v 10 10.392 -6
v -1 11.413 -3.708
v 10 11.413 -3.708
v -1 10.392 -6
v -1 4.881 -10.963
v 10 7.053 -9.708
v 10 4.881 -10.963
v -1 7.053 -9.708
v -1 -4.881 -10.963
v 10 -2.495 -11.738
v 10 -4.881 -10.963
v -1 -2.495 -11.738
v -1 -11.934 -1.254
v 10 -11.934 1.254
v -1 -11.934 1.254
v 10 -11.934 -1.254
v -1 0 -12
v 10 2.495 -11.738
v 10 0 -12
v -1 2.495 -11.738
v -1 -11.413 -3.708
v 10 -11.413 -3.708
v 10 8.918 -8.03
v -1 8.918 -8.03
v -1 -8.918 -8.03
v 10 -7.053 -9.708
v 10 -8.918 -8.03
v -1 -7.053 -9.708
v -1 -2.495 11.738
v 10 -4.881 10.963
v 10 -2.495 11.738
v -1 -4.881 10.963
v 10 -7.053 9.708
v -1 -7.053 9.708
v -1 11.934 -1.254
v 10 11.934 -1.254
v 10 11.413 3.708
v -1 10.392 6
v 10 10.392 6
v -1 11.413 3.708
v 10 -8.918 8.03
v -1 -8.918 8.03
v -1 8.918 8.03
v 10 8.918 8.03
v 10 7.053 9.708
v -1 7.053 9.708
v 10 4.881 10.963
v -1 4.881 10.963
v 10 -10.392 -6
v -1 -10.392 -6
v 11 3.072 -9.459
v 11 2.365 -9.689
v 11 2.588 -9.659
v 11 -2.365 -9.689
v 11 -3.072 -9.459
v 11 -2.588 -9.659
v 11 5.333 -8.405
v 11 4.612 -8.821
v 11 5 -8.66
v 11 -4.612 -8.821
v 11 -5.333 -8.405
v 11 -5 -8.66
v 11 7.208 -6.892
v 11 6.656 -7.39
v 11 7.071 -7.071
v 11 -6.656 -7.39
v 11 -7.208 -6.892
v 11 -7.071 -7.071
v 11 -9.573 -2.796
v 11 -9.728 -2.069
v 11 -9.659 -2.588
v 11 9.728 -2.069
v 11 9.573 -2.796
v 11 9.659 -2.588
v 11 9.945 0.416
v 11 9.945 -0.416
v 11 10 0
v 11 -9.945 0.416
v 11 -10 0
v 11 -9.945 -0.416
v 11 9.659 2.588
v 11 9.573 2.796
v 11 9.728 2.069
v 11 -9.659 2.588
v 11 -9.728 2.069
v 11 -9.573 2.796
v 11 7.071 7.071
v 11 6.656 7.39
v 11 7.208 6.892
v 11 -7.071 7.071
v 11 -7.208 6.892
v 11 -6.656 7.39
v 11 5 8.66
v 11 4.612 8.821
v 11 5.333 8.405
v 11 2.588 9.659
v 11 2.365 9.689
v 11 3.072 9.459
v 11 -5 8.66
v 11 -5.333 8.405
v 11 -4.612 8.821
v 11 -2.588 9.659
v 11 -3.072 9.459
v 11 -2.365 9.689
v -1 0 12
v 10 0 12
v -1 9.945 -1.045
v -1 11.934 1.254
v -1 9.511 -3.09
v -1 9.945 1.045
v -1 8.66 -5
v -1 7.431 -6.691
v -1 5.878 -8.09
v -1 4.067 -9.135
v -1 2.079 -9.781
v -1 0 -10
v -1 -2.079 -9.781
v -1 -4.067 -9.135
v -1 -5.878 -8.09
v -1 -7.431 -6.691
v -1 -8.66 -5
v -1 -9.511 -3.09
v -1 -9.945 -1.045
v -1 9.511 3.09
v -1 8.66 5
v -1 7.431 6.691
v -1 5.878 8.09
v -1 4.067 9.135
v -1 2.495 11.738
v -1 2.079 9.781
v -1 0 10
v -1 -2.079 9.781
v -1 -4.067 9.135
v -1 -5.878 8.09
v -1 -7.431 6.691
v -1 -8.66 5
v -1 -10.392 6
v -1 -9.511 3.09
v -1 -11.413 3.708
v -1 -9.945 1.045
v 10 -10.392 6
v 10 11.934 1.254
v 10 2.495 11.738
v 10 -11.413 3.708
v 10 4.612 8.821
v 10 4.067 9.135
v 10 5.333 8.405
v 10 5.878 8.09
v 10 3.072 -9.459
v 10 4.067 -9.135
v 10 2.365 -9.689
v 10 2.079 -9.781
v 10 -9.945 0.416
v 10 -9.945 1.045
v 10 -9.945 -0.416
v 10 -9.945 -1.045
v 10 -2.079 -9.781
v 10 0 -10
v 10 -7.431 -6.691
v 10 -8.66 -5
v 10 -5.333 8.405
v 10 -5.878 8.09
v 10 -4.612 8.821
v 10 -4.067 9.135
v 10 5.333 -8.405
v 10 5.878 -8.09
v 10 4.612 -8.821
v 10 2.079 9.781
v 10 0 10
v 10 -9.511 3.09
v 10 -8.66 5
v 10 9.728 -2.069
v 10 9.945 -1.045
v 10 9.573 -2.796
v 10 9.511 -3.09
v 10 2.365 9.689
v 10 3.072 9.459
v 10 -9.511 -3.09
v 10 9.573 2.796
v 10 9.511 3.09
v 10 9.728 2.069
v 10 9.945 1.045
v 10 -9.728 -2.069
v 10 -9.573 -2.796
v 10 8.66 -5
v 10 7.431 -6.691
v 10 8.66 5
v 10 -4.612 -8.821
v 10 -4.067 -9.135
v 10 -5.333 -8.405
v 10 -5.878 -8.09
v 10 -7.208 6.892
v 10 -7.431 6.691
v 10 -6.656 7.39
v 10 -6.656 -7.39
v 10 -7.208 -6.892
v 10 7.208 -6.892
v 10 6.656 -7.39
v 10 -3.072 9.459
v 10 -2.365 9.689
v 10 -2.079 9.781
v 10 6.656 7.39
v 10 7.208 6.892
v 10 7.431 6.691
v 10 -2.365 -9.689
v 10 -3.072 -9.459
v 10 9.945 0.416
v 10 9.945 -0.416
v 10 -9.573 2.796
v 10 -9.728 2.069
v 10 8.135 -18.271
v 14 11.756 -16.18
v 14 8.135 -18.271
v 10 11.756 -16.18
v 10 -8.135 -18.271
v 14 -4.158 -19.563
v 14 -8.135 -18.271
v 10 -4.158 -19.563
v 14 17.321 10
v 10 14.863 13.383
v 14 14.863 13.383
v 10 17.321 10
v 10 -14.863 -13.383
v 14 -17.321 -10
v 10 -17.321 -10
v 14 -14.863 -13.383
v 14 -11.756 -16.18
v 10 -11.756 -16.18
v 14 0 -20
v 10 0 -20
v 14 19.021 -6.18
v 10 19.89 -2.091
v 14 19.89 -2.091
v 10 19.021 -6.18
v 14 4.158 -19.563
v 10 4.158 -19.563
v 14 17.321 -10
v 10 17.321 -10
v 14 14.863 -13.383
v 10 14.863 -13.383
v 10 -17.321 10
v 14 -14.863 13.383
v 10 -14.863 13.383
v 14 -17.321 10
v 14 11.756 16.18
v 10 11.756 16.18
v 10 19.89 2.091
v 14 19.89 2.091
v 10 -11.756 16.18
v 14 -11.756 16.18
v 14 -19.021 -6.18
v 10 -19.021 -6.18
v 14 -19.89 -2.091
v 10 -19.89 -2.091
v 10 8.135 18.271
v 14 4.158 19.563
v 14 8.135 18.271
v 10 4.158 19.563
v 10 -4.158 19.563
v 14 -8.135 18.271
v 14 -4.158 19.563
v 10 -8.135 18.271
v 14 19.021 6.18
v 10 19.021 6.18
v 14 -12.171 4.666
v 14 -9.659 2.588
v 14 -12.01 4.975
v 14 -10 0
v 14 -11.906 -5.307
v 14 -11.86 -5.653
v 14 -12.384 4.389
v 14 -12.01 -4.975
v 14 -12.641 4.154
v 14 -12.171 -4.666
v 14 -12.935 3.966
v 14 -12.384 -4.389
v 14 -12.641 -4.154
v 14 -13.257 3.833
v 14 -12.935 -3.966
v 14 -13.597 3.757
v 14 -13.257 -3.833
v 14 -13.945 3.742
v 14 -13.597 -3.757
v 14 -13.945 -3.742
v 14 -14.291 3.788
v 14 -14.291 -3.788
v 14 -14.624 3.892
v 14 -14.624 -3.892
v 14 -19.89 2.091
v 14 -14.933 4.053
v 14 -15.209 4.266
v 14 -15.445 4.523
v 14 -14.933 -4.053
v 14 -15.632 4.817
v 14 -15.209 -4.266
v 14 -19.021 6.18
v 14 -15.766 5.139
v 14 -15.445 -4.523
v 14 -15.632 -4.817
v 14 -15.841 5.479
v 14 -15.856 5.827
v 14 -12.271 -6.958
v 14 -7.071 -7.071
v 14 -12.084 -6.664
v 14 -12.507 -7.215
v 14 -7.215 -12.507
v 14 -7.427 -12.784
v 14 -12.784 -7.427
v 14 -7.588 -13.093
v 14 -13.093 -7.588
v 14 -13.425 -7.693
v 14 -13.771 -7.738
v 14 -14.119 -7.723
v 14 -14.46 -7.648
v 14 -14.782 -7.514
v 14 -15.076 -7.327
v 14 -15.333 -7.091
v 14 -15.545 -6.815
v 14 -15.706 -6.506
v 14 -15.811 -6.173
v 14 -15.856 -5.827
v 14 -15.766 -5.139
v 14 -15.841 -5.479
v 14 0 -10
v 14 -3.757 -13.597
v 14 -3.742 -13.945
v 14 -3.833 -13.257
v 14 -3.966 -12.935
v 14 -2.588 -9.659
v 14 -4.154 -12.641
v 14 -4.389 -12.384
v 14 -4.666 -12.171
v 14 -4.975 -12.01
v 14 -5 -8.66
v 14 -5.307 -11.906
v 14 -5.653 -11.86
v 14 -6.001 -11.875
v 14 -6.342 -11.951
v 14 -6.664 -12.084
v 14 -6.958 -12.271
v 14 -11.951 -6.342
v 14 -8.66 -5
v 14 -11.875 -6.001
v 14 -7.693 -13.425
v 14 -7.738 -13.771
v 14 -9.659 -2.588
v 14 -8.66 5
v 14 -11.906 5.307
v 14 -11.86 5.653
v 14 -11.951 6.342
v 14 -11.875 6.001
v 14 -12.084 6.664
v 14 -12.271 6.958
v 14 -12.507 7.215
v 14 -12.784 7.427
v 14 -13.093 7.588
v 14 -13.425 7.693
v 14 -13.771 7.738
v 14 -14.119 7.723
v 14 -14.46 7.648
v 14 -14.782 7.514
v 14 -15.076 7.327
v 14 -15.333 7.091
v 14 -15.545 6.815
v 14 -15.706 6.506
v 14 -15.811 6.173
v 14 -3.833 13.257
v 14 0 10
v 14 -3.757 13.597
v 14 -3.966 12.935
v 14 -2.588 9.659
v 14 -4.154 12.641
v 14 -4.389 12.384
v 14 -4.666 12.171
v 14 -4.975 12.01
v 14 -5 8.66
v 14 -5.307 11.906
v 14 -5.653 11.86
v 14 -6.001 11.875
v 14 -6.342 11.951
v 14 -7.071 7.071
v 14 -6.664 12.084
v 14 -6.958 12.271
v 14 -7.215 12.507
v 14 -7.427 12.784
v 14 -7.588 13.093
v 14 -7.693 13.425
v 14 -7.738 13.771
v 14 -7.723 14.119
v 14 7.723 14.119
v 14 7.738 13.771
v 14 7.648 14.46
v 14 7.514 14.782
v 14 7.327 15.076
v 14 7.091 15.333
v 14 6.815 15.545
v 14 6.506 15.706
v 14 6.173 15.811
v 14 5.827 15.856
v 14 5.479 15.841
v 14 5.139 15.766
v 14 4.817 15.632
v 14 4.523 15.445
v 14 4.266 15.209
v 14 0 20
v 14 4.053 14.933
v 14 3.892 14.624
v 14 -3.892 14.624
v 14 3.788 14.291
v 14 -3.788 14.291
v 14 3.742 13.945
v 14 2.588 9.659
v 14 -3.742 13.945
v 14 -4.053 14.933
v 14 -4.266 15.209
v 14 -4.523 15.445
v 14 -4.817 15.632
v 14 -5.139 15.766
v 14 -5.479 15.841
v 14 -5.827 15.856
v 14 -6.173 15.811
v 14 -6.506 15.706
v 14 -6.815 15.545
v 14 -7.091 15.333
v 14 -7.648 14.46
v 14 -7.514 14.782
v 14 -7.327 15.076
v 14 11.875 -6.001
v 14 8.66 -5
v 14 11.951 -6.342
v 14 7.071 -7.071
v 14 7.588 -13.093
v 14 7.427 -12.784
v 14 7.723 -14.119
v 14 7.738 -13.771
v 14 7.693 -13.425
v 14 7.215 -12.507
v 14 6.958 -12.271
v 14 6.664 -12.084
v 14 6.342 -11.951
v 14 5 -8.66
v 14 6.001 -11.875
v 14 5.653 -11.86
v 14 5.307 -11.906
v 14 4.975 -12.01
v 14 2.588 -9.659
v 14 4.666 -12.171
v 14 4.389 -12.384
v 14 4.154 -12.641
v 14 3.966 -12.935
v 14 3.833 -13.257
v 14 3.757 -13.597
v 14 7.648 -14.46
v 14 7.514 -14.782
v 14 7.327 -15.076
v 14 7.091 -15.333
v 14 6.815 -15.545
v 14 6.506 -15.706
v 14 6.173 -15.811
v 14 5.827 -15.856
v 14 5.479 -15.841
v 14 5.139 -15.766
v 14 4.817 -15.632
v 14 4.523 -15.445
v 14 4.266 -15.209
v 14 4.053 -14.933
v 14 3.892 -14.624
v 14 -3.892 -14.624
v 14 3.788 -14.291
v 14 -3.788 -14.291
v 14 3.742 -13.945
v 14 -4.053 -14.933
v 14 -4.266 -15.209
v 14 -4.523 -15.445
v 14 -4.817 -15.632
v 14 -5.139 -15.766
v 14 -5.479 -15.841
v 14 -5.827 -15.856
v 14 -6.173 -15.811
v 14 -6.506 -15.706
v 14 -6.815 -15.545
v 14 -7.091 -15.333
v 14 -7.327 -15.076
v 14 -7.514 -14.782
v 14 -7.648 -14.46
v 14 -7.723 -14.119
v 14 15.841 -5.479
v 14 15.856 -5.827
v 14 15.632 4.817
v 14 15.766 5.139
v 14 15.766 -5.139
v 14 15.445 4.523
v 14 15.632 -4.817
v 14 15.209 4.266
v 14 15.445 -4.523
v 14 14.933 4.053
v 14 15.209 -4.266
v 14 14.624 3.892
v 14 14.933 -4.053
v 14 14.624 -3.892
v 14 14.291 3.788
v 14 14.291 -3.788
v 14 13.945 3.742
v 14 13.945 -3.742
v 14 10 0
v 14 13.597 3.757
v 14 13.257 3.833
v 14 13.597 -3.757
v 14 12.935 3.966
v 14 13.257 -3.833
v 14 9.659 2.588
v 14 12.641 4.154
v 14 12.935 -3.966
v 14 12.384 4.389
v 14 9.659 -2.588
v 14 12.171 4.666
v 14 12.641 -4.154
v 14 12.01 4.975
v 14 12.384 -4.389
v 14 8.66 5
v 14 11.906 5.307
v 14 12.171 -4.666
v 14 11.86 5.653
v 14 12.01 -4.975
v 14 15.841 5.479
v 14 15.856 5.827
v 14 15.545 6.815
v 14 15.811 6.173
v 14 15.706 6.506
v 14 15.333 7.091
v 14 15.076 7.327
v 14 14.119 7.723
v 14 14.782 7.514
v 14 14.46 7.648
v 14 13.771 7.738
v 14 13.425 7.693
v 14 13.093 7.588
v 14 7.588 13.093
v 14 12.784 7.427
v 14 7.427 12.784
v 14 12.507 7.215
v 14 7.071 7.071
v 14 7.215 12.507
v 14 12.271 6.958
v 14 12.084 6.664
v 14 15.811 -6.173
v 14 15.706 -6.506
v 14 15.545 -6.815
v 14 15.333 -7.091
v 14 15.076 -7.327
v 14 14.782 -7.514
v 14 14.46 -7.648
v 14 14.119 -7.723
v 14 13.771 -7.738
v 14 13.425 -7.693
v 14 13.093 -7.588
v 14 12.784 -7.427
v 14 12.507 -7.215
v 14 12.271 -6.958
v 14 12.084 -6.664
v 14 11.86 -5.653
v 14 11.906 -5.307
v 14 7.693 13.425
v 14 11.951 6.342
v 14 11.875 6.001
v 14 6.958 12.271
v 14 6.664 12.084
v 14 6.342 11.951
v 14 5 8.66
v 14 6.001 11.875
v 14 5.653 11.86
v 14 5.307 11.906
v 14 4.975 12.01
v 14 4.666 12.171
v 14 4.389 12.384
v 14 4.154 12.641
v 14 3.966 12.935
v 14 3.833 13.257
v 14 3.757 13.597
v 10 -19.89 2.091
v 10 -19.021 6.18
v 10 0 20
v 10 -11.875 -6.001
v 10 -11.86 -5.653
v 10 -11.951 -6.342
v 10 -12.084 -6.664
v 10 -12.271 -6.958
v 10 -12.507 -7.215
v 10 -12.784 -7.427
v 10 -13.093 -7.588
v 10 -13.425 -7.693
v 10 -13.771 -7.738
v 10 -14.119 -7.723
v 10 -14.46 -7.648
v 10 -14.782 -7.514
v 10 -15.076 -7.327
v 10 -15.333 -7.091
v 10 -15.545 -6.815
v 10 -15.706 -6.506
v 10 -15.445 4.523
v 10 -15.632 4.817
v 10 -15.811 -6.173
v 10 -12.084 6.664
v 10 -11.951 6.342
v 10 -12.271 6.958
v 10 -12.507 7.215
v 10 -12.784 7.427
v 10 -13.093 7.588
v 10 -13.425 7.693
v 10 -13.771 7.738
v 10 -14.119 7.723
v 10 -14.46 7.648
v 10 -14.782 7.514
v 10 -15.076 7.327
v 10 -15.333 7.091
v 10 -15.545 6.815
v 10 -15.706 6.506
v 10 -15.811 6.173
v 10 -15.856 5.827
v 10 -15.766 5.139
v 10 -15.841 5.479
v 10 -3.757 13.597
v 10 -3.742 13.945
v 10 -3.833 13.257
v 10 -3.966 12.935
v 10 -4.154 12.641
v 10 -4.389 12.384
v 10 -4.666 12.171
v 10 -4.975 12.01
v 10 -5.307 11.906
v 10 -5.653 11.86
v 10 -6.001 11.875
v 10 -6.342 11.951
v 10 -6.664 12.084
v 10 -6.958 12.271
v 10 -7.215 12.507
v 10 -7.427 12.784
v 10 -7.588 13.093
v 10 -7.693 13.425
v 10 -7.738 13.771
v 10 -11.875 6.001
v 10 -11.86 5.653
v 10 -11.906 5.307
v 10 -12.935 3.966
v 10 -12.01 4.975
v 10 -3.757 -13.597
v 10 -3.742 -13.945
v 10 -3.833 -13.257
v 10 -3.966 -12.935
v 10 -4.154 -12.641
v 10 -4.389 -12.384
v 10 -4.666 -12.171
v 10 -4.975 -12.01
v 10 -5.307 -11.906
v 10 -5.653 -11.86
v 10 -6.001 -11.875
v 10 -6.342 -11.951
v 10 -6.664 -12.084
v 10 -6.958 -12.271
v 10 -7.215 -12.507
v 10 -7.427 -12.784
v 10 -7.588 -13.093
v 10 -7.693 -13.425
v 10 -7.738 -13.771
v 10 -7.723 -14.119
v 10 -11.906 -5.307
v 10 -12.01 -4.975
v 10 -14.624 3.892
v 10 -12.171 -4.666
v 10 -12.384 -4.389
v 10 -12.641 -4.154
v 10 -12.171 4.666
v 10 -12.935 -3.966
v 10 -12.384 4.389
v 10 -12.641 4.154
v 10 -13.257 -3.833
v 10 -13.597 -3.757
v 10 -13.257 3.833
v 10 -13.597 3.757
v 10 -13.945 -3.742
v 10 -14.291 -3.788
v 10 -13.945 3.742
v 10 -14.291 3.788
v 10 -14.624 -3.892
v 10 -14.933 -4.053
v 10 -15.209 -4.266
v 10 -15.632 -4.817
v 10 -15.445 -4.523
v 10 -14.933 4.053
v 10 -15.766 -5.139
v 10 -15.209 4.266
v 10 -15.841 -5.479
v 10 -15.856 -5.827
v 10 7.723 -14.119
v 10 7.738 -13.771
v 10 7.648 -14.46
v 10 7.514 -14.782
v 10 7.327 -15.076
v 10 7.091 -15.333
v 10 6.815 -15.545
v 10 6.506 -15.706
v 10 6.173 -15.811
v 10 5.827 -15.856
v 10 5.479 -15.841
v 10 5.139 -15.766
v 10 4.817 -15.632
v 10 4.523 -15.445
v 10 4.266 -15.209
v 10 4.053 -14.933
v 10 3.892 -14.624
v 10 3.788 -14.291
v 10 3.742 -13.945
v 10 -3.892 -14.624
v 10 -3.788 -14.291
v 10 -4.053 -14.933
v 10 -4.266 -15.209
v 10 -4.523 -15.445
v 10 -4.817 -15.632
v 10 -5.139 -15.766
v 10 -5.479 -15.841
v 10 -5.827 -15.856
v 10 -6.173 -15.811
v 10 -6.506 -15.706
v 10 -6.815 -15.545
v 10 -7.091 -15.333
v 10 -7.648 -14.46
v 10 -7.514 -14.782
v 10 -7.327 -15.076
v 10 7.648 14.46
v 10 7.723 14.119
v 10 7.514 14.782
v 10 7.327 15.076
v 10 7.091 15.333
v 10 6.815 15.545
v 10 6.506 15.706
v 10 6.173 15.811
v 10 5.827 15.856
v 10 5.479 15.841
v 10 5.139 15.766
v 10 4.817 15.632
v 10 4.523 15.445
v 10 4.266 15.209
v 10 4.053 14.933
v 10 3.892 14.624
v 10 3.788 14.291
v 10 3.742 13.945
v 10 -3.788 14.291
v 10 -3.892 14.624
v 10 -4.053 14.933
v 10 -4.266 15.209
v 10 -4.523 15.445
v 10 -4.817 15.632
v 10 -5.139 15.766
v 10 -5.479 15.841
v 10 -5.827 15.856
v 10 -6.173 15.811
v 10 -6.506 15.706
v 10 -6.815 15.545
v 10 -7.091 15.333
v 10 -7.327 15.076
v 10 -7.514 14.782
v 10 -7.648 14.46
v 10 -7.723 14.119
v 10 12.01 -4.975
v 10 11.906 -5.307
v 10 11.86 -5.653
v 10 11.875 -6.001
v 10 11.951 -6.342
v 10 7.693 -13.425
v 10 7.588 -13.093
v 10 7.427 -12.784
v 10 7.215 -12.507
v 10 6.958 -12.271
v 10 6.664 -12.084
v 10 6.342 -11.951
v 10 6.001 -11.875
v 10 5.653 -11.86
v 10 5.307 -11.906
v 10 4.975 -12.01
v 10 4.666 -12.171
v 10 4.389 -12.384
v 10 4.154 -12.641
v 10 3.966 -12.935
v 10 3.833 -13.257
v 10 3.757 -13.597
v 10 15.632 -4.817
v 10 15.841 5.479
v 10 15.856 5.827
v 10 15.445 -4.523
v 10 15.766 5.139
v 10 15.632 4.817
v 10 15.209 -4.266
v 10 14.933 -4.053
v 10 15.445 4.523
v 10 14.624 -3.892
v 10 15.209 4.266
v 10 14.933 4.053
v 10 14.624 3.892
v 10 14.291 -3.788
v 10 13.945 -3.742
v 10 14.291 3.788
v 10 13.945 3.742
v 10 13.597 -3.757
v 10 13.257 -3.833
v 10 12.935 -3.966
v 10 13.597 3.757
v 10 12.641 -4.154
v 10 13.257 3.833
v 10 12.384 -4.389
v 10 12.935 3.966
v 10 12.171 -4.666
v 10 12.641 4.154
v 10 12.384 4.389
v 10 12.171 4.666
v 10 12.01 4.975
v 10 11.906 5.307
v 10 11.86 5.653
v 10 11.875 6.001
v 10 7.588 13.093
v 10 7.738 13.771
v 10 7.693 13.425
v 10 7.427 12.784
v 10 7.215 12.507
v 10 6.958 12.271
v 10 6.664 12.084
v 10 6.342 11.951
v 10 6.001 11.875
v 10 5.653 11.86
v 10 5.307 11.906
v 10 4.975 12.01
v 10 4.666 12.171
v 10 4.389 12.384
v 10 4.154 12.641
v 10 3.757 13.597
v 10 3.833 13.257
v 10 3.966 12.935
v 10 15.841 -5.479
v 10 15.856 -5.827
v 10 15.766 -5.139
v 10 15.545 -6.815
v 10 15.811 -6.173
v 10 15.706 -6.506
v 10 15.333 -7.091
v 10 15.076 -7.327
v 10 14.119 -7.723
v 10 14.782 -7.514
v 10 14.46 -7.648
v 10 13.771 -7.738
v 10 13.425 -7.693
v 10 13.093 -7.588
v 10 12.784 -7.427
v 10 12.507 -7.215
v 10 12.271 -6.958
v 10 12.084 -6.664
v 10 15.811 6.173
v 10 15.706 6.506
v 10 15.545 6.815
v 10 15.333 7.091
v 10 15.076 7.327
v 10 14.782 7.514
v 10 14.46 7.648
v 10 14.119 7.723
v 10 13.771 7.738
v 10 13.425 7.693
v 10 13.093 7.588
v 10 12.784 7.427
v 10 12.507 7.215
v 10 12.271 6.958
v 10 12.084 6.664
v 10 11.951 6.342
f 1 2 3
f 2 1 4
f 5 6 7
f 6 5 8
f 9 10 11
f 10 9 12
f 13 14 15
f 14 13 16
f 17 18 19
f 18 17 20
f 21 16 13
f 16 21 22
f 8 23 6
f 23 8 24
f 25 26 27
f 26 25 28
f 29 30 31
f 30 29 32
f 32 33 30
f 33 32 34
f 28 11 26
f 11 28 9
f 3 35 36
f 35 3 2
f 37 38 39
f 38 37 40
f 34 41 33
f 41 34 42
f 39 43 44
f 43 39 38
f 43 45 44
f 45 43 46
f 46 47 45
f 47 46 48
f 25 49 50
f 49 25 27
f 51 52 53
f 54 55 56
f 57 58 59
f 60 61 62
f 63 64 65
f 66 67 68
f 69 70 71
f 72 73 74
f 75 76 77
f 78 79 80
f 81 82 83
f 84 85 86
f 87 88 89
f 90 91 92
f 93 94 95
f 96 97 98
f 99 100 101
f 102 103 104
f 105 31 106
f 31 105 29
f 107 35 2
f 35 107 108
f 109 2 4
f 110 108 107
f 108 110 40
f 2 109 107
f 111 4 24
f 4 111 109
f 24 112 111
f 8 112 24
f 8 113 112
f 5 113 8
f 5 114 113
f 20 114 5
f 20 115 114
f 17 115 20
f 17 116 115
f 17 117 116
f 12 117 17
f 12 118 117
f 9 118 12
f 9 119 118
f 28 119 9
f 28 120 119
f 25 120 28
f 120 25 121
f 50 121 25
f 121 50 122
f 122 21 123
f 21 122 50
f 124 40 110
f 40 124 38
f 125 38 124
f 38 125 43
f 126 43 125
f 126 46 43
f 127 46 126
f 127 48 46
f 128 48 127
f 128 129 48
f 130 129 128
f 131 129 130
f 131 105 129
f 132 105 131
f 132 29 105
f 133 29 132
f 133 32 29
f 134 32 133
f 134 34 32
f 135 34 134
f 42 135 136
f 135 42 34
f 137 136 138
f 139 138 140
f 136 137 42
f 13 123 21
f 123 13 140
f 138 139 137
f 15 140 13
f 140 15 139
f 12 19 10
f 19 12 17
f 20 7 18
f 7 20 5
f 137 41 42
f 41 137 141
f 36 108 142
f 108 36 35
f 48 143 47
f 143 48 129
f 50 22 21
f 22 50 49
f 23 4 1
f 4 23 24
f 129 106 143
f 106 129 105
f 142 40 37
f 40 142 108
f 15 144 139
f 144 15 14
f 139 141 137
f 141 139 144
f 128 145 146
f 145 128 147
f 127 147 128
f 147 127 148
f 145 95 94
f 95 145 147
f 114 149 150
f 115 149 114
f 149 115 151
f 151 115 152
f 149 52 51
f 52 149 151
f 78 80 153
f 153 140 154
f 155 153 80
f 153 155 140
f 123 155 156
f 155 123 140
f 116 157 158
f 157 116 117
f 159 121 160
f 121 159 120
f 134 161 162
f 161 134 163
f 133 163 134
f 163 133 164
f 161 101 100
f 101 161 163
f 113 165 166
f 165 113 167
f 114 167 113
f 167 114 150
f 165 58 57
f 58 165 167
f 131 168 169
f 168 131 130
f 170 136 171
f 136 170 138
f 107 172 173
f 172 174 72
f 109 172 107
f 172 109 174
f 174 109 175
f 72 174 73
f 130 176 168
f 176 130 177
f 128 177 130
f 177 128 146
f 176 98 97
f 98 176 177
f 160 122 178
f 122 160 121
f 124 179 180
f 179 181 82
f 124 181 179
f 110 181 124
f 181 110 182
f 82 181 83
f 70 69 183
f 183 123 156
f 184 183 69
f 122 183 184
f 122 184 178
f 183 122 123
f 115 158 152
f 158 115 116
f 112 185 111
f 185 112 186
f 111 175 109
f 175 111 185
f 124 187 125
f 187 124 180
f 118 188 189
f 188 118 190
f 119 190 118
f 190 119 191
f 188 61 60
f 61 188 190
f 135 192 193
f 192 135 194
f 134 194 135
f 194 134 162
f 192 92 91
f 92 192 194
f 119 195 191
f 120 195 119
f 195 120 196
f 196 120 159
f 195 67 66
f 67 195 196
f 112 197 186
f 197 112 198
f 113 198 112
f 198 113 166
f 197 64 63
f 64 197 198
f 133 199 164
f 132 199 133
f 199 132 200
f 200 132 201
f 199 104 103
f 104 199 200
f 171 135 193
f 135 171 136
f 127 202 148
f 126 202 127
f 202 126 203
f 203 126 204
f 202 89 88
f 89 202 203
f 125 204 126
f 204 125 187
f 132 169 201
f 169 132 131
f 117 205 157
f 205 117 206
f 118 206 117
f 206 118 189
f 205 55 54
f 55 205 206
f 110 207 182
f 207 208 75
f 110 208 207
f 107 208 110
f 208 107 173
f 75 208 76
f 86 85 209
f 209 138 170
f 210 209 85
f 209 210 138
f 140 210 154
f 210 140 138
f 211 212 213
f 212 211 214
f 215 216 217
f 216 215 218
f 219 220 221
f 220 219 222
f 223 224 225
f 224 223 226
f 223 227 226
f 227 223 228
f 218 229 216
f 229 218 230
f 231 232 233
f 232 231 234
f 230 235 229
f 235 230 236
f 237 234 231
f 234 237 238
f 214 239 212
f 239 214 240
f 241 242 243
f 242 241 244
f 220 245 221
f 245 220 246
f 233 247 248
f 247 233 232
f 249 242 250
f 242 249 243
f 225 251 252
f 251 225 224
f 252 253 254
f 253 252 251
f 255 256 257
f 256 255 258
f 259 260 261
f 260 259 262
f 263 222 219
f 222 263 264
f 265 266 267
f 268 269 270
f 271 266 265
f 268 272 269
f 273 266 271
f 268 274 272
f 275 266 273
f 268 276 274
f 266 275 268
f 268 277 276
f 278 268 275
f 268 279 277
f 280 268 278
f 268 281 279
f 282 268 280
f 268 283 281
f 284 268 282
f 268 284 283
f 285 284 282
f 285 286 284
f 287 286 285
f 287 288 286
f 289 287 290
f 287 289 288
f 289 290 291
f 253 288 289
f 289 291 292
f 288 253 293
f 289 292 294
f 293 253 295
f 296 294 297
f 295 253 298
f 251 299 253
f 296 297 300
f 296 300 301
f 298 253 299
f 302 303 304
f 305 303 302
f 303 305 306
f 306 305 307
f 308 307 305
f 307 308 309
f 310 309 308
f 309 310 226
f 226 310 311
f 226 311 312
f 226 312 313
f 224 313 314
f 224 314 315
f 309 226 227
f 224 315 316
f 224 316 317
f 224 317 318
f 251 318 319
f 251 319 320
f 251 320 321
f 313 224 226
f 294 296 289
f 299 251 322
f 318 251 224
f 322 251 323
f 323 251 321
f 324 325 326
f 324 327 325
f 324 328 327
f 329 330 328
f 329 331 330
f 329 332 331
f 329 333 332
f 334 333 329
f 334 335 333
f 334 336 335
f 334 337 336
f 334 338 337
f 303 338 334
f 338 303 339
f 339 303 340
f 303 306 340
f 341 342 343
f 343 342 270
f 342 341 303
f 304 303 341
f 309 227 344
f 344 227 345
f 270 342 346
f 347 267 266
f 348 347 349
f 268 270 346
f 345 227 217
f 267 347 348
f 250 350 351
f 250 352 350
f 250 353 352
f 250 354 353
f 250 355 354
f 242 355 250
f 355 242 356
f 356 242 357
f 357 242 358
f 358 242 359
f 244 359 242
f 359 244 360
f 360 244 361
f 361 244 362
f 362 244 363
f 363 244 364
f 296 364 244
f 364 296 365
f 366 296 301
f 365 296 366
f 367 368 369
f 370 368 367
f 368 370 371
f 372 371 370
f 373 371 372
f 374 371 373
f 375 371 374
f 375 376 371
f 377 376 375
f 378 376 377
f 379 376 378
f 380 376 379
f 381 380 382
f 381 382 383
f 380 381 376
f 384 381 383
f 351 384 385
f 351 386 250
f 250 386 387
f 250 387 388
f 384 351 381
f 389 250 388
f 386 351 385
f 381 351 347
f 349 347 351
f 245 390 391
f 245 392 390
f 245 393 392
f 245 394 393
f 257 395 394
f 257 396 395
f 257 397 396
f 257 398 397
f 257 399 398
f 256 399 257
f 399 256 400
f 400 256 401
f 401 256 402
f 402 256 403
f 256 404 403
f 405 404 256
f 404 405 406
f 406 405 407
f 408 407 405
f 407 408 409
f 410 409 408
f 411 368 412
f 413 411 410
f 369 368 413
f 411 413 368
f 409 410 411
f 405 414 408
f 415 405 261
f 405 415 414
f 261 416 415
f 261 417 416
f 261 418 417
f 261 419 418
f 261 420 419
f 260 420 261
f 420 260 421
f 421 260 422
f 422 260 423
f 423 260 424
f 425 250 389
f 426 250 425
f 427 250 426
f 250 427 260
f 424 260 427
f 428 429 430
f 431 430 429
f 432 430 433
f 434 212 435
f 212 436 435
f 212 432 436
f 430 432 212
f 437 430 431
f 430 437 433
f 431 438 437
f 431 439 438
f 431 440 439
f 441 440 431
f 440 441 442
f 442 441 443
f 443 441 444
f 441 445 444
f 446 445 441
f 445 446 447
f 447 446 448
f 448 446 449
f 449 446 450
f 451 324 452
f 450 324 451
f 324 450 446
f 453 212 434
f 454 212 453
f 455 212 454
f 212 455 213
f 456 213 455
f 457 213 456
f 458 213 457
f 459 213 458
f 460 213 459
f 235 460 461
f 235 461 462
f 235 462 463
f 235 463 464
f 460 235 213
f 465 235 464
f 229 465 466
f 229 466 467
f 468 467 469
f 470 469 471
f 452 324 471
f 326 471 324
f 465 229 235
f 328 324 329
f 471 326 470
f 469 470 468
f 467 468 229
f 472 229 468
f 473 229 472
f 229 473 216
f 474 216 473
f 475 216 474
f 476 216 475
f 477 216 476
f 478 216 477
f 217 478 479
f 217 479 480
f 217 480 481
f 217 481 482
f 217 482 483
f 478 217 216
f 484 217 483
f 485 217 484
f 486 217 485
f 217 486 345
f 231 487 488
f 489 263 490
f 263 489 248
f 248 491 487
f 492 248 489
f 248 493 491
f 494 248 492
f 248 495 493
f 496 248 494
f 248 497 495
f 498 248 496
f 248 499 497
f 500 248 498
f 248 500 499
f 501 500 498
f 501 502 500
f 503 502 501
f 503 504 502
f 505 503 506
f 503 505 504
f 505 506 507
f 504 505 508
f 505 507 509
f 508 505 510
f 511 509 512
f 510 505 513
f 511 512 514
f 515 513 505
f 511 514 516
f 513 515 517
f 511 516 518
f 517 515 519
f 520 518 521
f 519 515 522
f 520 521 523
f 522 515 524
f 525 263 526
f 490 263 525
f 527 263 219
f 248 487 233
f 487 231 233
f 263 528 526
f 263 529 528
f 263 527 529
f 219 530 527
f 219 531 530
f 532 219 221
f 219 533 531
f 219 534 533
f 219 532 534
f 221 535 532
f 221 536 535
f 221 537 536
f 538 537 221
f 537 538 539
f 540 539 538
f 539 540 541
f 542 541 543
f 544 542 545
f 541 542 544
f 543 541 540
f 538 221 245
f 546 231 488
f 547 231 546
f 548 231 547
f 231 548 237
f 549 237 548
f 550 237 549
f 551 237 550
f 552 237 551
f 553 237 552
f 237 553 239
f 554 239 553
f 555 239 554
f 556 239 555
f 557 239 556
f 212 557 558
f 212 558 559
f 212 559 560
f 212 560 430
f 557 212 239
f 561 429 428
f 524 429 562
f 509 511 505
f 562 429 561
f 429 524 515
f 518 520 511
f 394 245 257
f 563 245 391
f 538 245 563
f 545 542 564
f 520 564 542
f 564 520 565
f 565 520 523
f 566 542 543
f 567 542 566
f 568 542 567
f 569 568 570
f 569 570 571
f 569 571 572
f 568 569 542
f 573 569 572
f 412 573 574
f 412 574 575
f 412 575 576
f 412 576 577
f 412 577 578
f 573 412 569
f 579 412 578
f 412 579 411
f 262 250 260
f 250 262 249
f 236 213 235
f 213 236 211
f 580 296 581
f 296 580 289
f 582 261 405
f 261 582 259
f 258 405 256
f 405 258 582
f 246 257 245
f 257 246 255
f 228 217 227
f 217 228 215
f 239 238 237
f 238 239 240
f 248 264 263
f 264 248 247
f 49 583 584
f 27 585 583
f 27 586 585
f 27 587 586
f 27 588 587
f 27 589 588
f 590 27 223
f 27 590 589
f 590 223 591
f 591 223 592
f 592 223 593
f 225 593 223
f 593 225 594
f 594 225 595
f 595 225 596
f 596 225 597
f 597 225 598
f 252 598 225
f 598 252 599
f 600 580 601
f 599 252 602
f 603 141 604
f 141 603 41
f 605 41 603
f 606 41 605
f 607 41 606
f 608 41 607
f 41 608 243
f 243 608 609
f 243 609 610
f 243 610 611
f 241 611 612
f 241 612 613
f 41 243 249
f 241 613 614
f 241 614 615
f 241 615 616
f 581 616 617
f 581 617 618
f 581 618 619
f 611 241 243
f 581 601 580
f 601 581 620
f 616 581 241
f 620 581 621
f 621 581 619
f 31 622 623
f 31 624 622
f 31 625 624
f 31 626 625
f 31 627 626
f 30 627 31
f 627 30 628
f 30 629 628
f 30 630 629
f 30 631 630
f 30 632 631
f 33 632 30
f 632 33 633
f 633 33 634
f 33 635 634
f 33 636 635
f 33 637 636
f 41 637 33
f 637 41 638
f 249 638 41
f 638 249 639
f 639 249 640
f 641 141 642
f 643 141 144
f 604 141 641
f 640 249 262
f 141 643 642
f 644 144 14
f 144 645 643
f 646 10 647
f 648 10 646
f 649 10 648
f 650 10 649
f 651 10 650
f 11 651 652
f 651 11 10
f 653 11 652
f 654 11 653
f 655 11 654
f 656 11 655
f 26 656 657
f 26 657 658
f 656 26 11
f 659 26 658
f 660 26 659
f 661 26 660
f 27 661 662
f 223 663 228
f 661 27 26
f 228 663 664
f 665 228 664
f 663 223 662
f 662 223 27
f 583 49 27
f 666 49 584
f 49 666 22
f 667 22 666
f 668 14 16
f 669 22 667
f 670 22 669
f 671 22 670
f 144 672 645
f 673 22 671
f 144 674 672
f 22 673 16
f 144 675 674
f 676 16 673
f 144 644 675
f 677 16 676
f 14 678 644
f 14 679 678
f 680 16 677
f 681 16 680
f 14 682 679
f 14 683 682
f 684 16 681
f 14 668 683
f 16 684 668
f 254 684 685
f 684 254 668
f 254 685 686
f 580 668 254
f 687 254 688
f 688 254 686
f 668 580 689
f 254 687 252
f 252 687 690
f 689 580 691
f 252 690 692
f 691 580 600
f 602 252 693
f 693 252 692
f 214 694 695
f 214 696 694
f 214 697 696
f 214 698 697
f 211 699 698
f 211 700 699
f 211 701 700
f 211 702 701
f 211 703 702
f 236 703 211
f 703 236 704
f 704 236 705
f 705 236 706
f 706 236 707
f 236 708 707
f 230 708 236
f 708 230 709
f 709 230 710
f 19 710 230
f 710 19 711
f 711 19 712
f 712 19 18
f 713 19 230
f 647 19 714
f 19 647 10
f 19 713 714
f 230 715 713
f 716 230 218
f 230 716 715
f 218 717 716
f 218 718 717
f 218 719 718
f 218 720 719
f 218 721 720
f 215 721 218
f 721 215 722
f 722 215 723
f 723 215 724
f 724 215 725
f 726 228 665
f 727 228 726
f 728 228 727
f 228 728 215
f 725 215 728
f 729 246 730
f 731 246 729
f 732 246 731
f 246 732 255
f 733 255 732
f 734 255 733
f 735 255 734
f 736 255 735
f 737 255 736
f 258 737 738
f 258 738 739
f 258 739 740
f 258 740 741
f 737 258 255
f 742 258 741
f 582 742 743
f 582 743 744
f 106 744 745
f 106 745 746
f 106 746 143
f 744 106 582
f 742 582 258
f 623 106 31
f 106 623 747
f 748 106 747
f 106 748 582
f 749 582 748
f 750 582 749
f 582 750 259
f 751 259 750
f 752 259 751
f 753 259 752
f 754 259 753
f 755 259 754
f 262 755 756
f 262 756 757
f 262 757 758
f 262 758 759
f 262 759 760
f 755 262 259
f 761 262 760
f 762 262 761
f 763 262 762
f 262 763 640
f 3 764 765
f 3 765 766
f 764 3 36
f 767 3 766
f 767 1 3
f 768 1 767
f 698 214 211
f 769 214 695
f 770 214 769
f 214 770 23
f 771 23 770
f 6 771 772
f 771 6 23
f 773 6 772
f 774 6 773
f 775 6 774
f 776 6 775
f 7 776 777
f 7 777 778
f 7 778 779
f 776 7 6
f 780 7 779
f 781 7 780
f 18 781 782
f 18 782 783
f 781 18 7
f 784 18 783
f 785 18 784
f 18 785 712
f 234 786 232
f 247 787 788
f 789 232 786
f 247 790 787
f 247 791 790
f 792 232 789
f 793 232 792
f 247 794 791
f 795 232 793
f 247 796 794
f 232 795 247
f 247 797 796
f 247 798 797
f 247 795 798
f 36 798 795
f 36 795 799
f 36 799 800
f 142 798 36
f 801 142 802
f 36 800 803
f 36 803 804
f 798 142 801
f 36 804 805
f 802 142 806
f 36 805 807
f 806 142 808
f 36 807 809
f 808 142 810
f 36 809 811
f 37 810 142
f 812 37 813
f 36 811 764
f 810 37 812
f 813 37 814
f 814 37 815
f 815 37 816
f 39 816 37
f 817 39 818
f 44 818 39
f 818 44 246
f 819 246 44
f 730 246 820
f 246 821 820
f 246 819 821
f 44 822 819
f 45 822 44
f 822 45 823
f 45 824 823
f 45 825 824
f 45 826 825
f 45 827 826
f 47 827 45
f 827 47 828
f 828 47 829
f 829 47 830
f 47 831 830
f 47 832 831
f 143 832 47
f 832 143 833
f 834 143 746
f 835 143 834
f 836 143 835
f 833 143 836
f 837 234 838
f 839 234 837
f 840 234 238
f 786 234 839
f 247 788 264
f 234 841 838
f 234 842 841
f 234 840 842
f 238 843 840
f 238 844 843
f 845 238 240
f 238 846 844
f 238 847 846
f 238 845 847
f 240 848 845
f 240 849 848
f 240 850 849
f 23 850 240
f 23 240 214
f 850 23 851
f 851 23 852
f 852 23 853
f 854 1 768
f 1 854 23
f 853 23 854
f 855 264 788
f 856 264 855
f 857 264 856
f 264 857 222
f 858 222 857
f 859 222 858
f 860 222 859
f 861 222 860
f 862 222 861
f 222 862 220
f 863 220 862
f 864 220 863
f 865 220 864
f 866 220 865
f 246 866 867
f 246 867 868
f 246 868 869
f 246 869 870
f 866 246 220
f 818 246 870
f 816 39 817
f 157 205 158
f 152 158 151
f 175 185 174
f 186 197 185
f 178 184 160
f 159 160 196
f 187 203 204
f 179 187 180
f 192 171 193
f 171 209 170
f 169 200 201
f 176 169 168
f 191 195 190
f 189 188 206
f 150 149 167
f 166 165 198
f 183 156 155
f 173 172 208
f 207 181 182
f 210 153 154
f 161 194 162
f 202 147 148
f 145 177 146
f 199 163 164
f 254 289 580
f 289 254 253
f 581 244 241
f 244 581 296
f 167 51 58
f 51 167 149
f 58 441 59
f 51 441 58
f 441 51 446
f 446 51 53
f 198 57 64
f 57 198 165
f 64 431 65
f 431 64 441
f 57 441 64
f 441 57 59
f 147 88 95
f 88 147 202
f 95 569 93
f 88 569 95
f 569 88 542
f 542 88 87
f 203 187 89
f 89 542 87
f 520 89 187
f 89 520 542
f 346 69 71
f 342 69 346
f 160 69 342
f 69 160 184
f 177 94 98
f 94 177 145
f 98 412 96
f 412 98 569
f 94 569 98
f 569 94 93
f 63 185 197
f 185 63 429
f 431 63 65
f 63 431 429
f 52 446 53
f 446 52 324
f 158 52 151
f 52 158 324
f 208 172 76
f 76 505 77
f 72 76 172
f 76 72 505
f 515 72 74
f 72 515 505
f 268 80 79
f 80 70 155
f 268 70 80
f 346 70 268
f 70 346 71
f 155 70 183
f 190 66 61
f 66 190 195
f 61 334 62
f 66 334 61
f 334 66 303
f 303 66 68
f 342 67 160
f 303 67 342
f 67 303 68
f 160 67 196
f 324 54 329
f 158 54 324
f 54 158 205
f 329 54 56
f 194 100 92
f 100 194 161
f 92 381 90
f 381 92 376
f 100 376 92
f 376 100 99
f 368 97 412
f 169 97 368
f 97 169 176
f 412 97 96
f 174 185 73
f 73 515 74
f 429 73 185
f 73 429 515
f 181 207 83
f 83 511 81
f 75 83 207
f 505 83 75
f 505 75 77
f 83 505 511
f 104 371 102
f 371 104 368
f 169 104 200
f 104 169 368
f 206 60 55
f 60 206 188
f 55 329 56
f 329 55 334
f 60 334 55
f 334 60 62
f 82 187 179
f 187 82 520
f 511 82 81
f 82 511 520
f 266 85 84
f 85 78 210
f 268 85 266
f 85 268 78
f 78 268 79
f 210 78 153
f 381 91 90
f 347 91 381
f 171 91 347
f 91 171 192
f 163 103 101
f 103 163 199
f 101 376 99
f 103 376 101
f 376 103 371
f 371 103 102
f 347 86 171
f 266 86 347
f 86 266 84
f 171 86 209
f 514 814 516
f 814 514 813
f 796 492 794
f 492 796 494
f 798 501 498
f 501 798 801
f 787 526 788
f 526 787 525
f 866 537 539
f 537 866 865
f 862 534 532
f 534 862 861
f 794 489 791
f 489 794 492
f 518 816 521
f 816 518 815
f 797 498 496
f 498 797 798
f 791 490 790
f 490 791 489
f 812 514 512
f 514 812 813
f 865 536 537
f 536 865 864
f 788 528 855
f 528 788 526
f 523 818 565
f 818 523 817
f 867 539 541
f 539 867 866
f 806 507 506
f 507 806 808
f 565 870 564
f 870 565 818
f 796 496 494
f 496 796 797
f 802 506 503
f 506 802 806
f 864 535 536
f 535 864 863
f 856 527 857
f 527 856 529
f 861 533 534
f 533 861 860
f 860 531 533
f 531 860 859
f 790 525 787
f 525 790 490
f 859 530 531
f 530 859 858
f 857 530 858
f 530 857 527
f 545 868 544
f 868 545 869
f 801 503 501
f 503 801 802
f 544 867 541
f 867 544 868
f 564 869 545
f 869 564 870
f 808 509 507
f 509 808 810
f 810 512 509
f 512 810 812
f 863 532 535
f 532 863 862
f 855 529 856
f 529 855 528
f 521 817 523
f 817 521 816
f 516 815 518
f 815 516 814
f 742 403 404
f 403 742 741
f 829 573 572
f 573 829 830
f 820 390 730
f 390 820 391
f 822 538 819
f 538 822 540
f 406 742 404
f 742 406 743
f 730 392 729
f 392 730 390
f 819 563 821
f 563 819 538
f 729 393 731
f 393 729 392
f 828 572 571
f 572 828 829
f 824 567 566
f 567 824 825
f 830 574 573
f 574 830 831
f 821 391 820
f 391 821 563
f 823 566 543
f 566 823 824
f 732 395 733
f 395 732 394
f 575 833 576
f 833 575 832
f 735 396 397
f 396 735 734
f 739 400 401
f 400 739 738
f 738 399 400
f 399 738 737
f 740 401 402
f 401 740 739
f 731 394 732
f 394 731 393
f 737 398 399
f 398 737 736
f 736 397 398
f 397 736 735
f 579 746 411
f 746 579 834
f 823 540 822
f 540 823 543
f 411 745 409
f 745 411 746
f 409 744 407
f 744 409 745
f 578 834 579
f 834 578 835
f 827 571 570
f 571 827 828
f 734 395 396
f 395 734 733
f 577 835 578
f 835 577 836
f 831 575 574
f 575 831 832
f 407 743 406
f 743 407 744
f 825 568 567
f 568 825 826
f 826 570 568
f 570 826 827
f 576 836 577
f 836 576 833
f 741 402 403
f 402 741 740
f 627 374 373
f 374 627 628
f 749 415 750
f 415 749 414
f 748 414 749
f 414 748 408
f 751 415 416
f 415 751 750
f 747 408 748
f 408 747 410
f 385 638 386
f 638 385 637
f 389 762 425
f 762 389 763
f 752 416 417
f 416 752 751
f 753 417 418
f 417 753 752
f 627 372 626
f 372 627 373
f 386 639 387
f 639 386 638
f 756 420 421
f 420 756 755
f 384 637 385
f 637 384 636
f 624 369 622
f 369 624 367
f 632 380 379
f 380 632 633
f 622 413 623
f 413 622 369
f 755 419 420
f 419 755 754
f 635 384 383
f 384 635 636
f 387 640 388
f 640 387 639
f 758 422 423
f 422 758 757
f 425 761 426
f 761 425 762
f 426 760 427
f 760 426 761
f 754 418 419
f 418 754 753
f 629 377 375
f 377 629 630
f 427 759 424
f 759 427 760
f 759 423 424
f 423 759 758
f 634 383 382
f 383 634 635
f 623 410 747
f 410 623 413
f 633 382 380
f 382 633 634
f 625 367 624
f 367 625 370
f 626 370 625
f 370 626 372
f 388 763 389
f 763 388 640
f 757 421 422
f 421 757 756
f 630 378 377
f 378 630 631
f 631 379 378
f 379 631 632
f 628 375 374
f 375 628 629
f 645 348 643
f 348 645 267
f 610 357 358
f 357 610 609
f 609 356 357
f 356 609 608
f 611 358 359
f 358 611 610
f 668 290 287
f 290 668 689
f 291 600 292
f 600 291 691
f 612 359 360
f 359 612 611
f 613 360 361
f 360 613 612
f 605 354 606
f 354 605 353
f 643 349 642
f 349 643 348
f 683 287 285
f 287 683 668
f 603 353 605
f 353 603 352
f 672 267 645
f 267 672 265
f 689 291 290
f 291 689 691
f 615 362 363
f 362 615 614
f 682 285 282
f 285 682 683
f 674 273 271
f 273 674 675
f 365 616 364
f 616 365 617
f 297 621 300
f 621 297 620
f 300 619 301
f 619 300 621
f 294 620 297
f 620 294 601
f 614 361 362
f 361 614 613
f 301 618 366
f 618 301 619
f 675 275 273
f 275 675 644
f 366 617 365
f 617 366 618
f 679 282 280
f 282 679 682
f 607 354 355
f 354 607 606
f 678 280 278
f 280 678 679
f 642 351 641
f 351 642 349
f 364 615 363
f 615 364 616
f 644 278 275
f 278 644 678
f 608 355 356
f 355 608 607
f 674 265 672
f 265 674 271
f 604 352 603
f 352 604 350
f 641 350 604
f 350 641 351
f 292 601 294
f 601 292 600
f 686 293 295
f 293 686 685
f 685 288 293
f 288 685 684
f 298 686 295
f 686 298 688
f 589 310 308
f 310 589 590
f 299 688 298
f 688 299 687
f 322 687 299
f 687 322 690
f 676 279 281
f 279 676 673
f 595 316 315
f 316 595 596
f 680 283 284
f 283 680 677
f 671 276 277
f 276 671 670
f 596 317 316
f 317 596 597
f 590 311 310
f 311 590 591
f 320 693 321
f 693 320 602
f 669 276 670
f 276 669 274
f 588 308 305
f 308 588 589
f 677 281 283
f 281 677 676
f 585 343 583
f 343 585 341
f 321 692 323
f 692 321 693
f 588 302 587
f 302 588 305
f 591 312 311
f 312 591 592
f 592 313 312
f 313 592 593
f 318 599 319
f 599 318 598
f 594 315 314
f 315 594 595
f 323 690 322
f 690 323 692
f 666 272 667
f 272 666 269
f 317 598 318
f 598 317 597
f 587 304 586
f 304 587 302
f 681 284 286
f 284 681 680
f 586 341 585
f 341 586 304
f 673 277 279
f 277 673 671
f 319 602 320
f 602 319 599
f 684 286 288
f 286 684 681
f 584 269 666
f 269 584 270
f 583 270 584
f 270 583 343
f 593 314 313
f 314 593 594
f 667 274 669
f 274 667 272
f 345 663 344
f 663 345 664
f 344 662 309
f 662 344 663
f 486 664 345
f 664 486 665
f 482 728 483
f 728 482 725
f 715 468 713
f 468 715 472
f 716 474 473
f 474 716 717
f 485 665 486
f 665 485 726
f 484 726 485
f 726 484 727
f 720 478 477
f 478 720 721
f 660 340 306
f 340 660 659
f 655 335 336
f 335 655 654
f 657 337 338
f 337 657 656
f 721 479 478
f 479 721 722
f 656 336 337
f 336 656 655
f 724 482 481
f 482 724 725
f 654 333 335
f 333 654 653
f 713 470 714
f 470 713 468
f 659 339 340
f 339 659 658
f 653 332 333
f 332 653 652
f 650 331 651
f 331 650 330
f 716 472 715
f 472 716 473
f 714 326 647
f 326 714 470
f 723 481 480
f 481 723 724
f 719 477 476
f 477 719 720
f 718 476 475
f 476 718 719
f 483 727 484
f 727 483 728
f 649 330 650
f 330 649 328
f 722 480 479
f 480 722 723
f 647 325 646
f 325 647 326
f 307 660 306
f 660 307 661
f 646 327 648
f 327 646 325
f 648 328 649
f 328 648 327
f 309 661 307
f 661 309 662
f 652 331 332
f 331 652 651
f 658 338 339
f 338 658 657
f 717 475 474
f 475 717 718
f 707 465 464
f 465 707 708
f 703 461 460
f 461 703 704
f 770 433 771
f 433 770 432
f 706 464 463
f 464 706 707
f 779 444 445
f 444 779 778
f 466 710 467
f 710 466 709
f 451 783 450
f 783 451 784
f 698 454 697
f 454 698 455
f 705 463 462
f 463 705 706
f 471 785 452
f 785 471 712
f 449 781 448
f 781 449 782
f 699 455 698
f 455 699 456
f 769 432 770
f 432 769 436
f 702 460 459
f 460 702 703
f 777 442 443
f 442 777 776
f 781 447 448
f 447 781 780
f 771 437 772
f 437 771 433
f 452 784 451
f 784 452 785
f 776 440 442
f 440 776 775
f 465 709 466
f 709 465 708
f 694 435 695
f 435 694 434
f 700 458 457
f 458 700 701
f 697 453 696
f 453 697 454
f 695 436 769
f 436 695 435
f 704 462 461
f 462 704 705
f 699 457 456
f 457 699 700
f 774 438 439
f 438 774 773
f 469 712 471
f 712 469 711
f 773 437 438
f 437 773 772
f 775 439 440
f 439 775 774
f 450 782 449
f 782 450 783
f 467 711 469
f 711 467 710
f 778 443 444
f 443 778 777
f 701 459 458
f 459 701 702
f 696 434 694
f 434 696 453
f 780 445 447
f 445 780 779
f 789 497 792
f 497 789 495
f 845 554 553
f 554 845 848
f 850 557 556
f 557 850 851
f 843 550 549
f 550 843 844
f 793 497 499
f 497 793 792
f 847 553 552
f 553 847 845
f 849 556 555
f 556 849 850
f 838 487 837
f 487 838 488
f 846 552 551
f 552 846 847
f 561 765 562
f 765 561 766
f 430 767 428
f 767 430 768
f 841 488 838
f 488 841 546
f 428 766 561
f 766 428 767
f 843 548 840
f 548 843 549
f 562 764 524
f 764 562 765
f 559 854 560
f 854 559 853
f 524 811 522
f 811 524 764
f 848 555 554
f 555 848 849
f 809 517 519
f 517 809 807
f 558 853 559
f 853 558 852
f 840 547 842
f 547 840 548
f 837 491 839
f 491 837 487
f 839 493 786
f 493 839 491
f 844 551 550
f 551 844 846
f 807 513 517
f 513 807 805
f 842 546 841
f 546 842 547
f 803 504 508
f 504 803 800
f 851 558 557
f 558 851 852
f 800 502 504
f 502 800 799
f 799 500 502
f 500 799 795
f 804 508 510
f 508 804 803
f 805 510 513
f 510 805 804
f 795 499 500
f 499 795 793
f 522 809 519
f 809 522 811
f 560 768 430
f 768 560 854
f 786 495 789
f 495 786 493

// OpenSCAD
module flange(){
	difference(){
		//tubeBody
		translate([5,0,0]) rotate([0,90,0]) cylinder(h=12,r=12,center=true);
		//throat
		translate([5,0,0]) rotate([0,90,0]) cylinder(h=13,r=10,center=true);
	}
}

module flangeFace(){
	difference(){
		union(){
			difference(){
				//flange
				translate([12,0,0]) rotate([0,90,0]) cylinder(r=20,h=4,center=true);
				//flangeThroat
				translate([12,0,0]) rotate([0,90,0]) cylinder(r=10,h=5,$fn=24,center=true);
			}
		}
		//tubeMountingHoles
		rotate([22.5,0,0]){
			for ( v = [0 : 8] ){
				rotate( v * 360 / 8, [1, 0, 0]){
					translate([12, 15, 0]){
						rotate([0,90,0]){
							cylinder(r=2,h=5,$fn=36,center=true);
						}
					}
				}
			}
		}
	}
}


union(){
	flange();
	flangeFace();
}
